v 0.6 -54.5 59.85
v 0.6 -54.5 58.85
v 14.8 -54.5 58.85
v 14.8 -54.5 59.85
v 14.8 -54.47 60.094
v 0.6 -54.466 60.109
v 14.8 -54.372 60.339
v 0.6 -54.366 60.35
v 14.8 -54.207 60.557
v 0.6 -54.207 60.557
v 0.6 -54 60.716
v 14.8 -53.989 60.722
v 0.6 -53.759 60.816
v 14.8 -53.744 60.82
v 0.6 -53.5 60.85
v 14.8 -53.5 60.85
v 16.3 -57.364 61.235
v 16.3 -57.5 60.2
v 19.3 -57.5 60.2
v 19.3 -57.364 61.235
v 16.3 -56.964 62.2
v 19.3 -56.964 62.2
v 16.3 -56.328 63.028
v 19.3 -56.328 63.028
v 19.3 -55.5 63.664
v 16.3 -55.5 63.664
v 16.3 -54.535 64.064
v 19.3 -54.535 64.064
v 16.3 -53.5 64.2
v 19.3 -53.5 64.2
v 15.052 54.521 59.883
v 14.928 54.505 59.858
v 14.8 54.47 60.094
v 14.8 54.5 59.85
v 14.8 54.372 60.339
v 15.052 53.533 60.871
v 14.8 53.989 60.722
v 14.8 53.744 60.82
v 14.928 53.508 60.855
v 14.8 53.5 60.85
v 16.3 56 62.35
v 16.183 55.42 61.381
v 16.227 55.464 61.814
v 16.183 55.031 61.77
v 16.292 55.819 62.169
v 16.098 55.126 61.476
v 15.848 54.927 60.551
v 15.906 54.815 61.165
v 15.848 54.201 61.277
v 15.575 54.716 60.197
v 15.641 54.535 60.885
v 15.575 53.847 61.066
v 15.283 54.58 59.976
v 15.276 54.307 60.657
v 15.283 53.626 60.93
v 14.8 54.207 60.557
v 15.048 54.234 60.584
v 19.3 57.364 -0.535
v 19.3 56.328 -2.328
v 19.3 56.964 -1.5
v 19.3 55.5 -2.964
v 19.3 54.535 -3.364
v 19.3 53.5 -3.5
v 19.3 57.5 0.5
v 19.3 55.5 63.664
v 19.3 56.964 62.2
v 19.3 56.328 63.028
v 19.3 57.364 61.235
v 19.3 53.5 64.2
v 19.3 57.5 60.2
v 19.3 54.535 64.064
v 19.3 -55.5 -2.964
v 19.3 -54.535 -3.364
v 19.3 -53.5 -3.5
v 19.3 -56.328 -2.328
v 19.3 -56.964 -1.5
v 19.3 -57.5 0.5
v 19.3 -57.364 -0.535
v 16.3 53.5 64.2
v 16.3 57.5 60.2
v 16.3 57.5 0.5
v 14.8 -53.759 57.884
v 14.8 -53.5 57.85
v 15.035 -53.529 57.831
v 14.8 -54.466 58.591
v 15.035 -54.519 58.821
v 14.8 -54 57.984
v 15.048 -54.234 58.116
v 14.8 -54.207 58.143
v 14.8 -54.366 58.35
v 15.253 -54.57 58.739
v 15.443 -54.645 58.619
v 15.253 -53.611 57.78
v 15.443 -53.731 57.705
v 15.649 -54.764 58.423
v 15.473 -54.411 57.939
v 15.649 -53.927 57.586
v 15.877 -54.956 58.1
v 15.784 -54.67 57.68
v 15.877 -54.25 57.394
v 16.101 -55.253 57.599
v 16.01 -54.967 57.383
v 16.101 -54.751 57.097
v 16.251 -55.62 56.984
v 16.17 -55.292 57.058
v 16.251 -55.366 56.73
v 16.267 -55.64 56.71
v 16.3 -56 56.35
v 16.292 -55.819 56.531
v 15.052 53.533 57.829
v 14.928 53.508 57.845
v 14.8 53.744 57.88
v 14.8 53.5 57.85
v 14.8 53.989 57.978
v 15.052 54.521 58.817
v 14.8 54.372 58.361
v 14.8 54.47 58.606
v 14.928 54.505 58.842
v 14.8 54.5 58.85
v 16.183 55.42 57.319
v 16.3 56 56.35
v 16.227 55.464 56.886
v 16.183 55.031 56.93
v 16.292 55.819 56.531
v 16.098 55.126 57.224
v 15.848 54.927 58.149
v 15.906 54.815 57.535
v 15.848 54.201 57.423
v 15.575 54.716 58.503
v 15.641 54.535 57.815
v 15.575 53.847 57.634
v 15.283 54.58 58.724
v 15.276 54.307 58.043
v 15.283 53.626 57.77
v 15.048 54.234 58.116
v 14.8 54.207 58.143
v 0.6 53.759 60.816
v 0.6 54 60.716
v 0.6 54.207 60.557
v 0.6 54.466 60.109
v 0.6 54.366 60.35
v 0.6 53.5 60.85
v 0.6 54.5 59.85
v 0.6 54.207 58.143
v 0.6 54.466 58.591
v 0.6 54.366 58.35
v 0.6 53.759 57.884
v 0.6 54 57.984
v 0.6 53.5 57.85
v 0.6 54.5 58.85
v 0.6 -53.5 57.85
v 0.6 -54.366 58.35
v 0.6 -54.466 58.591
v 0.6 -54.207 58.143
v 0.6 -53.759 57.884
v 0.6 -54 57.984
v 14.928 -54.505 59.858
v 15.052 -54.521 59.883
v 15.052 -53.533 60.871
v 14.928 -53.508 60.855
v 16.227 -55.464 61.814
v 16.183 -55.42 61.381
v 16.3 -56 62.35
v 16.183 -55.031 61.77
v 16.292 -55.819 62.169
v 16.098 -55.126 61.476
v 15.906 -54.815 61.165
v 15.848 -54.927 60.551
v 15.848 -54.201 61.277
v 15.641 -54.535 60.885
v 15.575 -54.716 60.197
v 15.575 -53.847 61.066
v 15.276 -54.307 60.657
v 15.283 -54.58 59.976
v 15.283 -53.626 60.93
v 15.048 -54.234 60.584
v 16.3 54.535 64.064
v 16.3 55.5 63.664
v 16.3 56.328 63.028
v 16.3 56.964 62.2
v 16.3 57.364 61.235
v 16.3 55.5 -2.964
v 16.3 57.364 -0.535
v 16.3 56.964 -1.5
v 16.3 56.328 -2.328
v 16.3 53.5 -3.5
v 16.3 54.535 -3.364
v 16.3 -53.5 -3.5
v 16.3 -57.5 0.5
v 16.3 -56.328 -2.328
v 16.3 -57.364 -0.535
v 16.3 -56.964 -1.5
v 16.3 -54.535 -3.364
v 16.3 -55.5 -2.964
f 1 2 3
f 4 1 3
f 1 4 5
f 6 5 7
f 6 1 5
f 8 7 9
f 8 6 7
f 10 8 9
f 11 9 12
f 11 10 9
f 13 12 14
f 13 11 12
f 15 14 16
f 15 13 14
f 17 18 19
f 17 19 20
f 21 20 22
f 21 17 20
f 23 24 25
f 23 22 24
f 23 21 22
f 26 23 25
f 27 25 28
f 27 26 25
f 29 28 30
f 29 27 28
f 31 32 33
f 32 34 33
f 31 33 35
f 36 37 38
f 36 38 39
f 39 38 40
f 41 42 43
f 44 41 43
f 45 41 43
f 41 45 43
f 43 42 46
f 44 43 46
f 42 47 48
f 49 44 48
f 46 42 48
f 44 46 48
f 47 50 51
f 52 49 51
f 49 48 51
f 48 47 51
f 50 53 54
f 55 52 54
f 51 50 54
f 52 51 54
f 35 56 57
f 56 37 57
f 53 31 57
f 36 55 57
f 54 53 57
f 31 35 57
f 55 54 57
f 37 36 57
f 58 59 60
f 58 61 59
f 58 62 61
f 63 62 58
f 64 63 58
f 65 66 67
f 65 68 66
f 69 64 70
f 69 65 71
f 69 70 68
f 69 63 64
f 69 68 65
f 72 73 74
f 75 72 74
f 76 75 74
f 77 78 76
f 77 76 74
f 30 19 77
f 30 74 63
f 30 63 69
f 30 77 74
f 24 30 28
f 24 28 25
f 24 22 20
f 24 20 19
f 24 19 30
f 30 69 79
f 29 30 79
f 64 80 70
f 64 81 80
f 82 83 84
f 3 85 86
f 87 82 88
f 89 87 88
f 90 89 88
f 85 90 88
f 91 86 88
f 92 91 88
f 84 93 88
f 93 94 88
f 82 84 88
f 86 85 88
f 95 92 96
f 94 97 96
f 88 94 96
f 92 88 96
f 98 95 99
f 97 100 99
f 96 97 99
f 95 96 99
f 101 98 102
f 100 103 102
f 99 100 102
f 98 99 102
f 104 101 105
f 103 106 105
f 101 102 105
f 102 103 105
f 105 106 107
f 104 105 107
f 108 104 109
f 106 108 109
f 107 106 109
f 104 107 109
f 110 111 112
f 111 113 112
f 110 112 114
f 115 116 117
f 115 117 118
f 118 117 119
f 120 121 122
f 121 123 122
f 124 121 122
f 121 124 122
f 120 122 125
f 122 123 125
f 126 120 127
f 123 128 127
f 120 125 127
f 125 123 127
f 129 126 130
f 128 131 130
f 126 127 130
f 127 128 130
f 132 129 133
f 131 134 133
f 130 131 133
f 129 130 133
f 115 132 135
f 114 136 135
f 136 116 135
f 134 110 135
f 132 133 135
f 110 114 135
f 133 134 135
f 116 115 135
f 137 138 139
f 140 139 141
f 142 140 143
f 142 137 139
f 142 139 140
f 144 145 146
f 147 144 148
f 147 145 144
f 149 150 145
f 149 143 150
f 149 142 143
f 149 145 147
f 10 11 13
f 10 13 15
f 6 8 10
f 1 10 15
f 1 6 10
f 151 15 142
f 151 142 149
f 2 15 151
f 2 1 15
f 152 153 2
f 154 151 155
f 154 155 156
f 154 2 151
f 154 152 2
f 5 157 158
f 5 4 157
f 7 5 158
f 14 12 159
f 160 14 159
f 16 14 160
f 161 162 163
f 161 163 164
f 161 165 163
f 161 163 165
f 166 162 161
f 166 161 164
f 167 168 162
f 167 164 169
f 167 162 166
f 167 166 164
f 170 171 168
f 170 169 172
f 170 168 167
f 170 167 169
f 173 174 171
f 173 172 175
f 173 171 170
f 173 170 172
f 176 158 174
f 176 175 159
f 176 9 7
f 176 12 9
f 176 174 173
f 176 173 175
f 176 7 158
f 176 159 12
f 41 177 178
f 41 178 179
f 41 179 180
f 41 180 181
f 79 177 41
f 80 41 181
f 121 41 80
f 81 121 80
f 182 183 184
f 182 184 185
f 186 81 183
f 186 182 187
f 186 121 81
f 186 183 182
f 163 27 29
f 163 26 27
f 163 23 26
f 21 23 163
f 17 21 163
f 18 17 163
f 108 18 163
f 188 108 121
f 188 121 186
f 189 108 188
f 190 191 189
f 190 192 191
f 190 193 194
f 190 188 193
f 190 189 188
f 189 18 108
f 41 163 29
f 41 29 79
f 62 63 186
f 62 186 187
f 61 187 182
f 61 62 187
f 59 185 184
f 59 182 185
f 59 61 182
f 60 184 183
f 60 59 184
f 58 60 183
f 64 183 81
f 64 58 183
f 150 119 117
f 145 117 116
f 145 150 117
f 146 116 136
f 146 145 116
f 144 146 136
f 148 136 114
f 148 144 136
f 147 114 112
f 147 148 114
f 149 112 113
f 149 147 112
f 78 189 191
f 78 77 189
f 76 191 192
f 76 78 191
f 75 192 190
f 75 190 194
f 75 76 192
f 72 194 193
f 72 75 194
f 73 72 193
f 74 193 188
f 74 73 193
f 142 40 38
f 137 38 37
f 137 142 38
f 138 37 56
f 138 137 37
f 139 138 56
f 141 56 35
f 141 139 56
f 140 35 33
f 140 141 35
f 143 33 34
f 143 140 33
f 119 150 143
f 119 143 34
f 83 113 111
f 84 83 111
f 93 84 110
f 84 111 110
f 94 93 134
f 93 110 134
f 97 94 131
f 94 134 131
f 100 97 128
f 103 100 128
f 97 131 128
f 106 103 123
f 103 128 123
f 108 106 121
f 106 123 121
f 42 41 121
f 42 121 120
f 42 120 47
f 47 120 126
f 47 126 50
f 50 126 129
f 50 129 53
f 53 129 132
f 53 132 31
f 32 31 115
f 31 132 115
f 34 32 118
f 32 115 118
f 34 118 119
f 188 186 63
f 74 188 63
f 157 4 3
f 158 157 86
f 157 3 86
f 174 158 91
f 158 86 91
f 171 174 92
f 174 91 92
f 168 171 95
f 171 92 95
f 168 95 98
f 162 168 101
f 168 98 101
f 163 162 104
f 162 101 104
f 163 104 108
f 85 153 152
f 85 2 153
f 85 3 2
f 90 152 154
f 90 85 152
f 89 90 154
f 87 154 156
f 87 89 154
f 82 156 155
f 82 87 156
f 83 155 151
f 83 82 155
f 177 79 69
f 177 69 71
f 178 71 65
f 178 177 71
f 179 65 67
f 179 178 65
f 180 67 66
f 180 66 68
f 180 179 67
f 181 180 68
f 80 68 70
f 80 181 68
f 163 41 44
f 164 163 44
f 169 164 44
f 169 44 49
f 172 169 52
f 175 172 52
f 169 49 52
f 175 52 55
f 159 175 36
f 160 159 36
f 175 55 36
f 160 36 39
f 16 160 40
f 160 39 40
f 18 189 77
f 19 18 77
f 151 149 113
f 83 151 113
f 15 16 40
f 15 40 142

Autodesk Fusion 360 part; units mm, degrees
sketch "Boceto1" plane through (0, 0, 0) normal (1, 0, 0) x (0, 1, 0)
  line L0 (-54.5, 54) -> (54.5, 54)
  line L1 (54.5, 54) -> (54.5, 0)
  line L2 (54.5, 0) -> (-54.5, 0)
  line L3 (-54.5, 0) -> (-54.5, 54)
  dimension "d4" = 54
  dimension "d5" = 109
extrude "Extruir1" add sketch "Boceto1" along normal blind 14 makes body 1
sketch "Boceto2" plane through (0, 0, 0) normal (-1, 0, 0) x (0, -1, 0)
  line L0 (-54.5, 0) -> (54.5, 0)
  line L1 (54.5, 0) -> (54.5, 54)
  line L2 (54.5, 54) -> (-54.5, 54)
  line L3 (-54.5, 54) -> (-54.5, 0)
  line L4 (-58, -3.5) -> (-58, 64.2)
  line L5 (-58, 64.2) -> (-51.5, 64.2)
  line L6 (-51.5, 64.2) -> (-51.5, 61.2)
  line L7 (-51.5, 61.2) -> (-55, 61.2)
  line L8 (-55, 61.2) -> (-55, 57.5)
  line L9 (-55, 57.5) -> (-51.5, 57.5)
  line L10 (-51.5, 57.5) -> (-51.5, 54.5)
  line L11 (-51.5, 54.5) -> (-55, 54.5)
  line L12 (-55, 54.5) -> (-55, -0.5)
  line L13 (-55, -0.5) -> (0, -0.5)
  line L14 (-58, -3.5) -> (0, -3.5)
  line L15 (0, 2.5) -> (0, 20)
  line L16 (58, -3.5) -> (0, -3.5)
  line L17 (55, -0.5) -> (0, -0.5)
  line L18 (55, 54.5) -> (55, -0.5)
  line L19 (58, -3.5) -> (58, 64.2)
  line L20 (51.5, 54.5) -> (55, 54.5)
  line L21 (51.5, 57.5) -> (51.5, 54.5)
  line L22 (55, 57.5) -> (51.5, 57.5)
  line L23 (55, 61.2) -> (55, 57.5)
  line L24 (51.5, 61.2) -> (55, 61.2)
  line L25 (51.5, 64.2) -> (51.5, 61.2)
  line L26 (58, 64.2) -> (51.5, 64.2)
  line L27 (51.5, 64.2) -> (-51.5, 64.2)
  dimension "d10" = 0.5
  dimension "d11" = 3.7
  dimension "d12" = 3.5
  dimension "d13" = 0.5
  dimension "d14" = 0.5
  dimension "d15" = 3
  dimension "d16" = 3
  dimension "d17" = 3
  dimension "d18" = 3
extrude "Extruir2" add sketch "Boceto2" along normal blind 0 and the other way blind 16 separate body contours L4 L5 L6 L7 L8 L9 L10 L11 L12 L13 L14 L16 L17 L18 L19 L20 L21 L22 L23 L24 L25 L26 makes body 2
extrude "Extruir3" add sketch "Boceto2" along normal blind 3 contours L0 L1 L2 L3 | L4 L5 L6 L7 L8 L9 L10 L11 L12 L13 L14 L16 L17 L18 L19 L20 L21 L22 L23 L24 L25 L26 | L6 L7 L8 L9 L10 L11 L12 L13 L17 L18 L20 L21 L22 L23 L24 L25 L27 bodies 2
fillet "Empalme1" radius 4 4 edges at (6.5, 58, 64.2) (6.5, 58, -3.5) (6.5, -58, 64.2) (6.5, -58, -3.5) on bodies 2
fillet "Empalme2" radius 0.5 8 edges at (8, 51.5, 64.2) (8, 51.5, 54.5) (8, 51.5, 57.5) (8, 51.5, 61.2) (8, -51.5, 54.5) (8, -51.5, 61.2) (8, -51.5, 64.2) (8, -51.5, 57.5) on bodies 2
sketch "Boceto3" plane through (0, 0, 0) normal (0, 1, 0) x (1, 0, 0)
  line L0 (19.3, -64.2) -> (16.3, -64.2)
  line L1 (16.3, -64.2) -> (16.3, 3.5)
  line L2 (16.3, 3.5) -> (19.3, 3.5)
  line L3 (19.3, 3.5) -> (19.3, -64.2)
  line L4 (16.3, -60.85) -> (0.6, -60.85)
  line L5 (0.6, -60.85) -> (0.6, -57.85)
  line L6 (0.6, -57.85) -> (16.3, -57.85)
  line L7 (16.3, -57.85) -> (16.3, -60.85)
  line L8 (0, -61.2) -> (0, -57.5)
  line L9 (16, -61.2) -> (0, -61.2)
  point P0 (16, 3.5)
  point P1 (16, -64.2)
  dimension "d29" = 3
  dimension "d30" = 0.6
  dimension "d31" = 0.35
  dimension "d32" = 0.3
  dimension "d33" = 3
extrude "Extruir4" add sketch "Boceto3" along normal mid plane 109 separate body contours L1 L4 L5 L6 L7 makes body 3
extrude "Extruir5" add sketch "Boceto3" along normal mid plane 115 contours L0 L1 L2 L3 L7 bodies 3
fillet "Empalme3" radius 4 4 edges at (17.8, 57.5, 64.2) (17.8, -57.5, 64.2) (17.8, -57.5, -3.5) (17.8, 57.5, -3.5) on bodies 3
fillet "Empalme4" radius 1.5 4 edges at (16.3, 0, 57.85) (16.3, -54.5, 59.35) (16.3, 0, 60.85) (16.3, 54.5, 59.35) on bodies 3
fillet "Empalme5" radius 1 8 edges at (7.7, 54.5, 60.85) (15.8607, 54.9393, 61.2893) (15.8607, 54.9393, 57.4107) (7.7, 54.5, 57.85) (15.8607, -54.9393, 61.2893) (7.7, -54.5, 60.85) (7.7, -54.5, 57.85) (15.8607, -54.9393, 57.4107) on bodies 3
hidden bodies 1 2
equation "largo = 14 mm"
equation "ancho = 109 mm"
equation "alto = 54 mm"
equation "d4 = alto"
equation "d5 = ancho"
equation "d6 = largo"
equation "d21 = largo + 2 mm"
equation "d36 = ancho"
equation "d38 = ancho + 6 mm"
